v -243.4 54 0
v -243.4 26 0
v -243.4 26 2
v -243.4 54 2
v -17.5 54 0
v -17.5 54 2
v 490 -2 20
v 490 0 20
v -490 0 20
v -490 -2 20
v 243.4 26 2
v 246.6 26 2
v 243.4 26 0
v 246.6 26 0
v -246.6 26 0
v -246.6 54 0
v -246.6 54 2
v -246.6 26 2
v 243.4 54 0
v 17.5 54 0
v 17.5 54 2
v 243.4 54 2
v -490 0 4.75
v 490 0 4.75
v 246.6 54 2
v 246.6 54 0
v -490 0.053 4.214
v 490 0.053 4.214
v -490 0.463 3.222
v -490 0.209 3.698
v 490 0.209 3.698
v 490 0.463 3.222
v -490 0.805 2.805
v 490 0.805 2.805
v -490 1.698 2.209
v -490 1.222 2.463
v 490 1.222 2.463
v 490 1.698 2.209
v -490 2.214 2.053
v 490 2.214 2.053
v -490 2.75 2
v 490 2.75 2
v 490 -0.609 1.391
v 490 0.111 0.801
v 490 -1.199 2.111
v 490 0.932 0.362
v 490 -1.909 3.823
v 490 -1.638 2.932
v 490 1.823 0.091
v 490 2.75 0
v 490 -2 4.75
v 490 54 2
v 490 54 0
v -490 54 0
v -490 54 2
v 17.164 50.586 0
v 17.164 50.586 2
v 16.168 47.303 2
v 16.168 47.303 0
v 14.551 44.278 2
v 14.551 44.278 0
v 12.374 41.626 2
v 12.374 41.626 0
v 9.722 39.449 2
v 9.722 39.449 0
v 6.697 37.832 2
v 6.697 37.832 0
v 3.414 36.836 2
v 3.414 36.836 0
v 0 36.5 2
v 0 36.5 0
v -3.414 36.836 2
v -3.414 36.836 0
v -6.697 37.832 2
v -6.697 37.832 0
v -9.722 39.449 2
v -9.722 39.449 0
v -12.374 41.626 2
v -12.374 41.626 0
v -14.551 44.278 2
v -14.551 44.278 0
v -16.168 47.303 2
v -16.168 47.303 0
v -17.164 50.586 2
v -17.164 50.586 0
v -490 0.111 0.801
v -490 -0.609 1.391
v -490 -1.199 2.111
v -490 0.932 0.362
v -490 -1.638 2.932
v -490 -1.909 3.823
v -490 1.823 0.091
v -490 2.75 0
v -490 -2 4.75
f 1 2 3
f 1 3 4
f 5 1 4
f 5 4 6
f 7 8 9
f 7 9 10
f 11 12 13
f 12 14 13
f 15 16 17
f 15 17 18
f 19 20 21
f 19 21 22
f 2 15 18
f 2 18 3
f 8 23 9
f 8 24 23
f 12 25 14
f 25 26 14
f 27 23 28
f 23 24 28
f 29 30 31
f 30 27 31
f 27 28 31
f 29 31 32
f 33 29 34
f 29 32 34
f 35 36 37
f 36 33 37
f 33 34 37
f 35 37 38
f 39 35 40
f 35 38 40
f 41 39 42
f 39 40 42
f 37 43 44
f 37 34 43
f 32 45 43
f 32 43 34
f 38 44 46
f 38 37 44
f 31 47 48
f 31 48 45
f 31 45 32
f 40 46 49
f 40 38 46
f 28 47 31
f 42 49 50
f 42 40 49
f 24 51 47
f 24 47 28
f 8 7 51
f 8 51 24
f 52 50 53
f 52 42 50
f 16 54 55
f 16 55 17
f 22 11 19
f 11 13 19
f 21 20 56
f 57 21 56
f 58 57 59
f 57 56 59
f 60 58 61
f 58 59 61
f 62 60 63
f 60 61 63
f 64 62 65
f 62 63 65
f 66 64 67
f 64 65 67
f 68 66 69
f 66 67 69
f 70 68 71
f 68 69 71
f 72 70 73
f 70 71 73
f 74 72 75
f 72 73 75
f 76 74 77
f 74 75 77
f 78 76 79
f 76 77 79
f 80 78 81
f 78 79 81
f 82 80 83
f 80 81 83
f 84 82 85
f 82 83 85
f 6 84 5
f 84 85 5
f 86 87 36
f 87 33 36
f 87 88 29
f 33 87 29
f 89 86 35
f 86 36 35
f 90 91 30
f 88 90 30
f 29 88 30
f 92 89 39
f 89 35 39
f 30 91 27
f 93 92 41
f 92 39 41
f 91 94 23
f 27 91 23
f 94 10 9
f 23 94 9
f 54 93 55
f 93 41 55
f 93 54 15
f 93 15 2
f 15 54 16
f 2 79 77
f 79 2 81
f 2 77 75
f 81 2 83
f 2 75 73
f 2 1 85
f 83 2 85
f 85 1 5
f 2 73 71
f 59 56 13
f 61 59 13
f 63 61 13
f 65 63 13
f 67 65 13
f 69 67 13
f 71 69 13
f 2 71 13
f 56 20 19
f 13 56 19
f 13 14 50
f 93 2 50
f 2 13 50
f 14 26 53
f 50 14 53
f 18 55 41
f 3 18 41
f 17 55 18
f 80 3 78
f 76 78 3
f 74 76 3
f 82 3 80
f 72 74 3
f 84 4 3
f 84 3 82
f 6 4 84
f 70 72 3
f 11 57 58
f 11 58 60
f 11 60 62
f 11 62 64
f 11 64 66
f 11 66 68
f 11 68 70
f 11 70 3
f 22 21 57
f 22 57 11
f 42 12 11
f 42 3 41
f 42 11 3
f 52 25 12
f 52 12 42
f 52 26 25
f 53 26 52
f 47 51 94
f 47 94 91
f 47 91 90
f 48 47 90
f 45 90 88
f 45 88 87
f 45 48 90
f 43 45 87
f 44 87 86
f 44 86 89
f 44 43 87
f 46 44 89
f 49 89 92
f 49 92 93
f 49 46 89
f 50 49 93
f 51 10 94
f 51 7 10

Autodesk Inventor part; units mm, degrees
ref_plane "YZ Plane" through (0, 0, 0) normal (1, 0, 0) x (0, 1, 0)
ref_plane "XZ Plane" through (0, 0, 0) normal (0, 1, 0) x (-1, 0, 0)
ref_plane "XY Plane" through (0, 0, 0) normal (0, 0, 1) x (1, 0, 0)
sketch "Sketch1" plane through (0, 0, 0) normal (0, 0, 1) x (1, 0, 0)
  line L0 (-490, 54) -> (490, 54)
  line L1 (490, 54) -> (490, 0)
  line L2 (490, 0) -> (-490, 0)
  line L3 (-490, 0) -> (-490, 54)
  point P0 (0, 0)
  point P1 (0, 0)
  dimension "d0" = 980
  dimension "d1" = 54
extrude "Plate1" add sketch "Sketch1" along normal blind 2
sketch "Sketch2" plane through (490, -2, 0) normal (0, 1, 0) x (-1, 0, 0)
  line L0 (980, 0) -> (0, 0)
  line L1 (0, 0) -> (0, 20)
  line L2 (0, 20) -> (980, 20)
  line L3 (980, 20) -> (980, 0)
edge flange "Flange1" height 20 angle 90 thickness 2 bend radius 2.75 thickness toward (0, 1, 0) relief round relief width 2 relief depth 1 edges at (0, 0, 2) wall of the first edge with corners at (-490, -2, 0) (490, -2, 0) (490, -2, 20) (-490, -2, 20)
bend "Bend1"
corner "Corner1"
sketch "Sketch5" plane through (0, 0, 0) normal (0, 0, -1) x (-1, 0, 0)
  line L0 (490, 54) -> (-490, 54) projected
  line L1 (490, -2) -> (-490, -2) projected
  circle A0 centre (0, 54) radius 17.5
  line L2 (243.4, 54) -> (246.6, 54)
  line L3 (246.6, 54) -> (246.6, 26)
  line L4 (246.6, 26) -> (243.4, 26)
  line L5 (243.4, 26) -> (243.4, 54)
  line L6 (-243.4, 54) -> (-246.6, 54)
  line L7 (-246.6, 54) -> (-246.6, 26)
  line L8 (-246.6, 26) -> (-243.4, 26)
  line L9 (-243.4, 26) -> (-243.4, 54)
  line L10 (0, 54) -> (0, -2) construction
  point P0 (0, 0)
  point P1 (-490, -2)
  point P2 (245, 26)
  point P3 (-245, 26)
  point P4 (246.6, 54)
  point P5 (-17.5, 54)
  point P6 (17.5, 54)
  point P7 (-246.6, 54)
  dimension "d45" = 35
  dimension "d48" = 3.2
  dimension "d49" = 490
  dimension "d51" = 28
  dimension "d52" = 28
extrude "Extrusion1" cut sketch "Sketch5" against normal through all contours L3 L4 L5 L0 | L9 L8 L7 L0 | A0 L0 picked at (-2.238, 47.1497)
sketch "Sketch9" plane through (0, 0, 2) normal (0, 0, 1) x (1, 0, 0)
  line L0 (485.6141, 29.596) -> (485.6141, 17.596) construction
  line L1 (485.6141, 17.596) -> (285.6141, 17.596) construction
  line L2 (285.6141, 17.596) -> (285.6141, 29.596) construction
  line L3 (285.6141, 29.596) -> (485.6141, 29.596) construction
  line L4 (-490, 54) -> (490, 54) projected
  point P0 (0, 0)
  point P1 (1.05, 68)
  point P2 (490, 54)
  dimension "d40" = 200
  dimension "d41" = 12
mark "Mark2"
equation "\"d2\" = Thickness"
equation "\"d3\" = BendReliefWidth"
equation "\"d4\" = BendReliefDepth"
equation "\"d5\" = MinimumRemnant"
equation "\"d6\" = TransitionRadius"
equation "\"d9\" = BendRadius"
equation "\"d10\" = CornerReliefSize"
equation "\"d11\" = GapSize"
equation "\"d12\" = JacobiRadiusSize"
equation "\"BendReliefWidth\" = Thickness"
equation "\"BendReliefDepth\" = 0.5 * Thickness"
equation "\"CornerReliefSize\" = 4 * Thickness"
equation "\"MinimumRemnant\" = 2 * Thickness"
equation "\"TransitionRadius\" = BendRadius"
equation "\"JacobiRadiusSize\" = BendRadius"
equation "\"GapSize\" = Thickness"
equation "\"Thickness\" = 2"
equation "\"BendRadius\" = 2.75"
properties part number "MSC 329 STRINGER BOARD  ###" material "Stainless Steel"
